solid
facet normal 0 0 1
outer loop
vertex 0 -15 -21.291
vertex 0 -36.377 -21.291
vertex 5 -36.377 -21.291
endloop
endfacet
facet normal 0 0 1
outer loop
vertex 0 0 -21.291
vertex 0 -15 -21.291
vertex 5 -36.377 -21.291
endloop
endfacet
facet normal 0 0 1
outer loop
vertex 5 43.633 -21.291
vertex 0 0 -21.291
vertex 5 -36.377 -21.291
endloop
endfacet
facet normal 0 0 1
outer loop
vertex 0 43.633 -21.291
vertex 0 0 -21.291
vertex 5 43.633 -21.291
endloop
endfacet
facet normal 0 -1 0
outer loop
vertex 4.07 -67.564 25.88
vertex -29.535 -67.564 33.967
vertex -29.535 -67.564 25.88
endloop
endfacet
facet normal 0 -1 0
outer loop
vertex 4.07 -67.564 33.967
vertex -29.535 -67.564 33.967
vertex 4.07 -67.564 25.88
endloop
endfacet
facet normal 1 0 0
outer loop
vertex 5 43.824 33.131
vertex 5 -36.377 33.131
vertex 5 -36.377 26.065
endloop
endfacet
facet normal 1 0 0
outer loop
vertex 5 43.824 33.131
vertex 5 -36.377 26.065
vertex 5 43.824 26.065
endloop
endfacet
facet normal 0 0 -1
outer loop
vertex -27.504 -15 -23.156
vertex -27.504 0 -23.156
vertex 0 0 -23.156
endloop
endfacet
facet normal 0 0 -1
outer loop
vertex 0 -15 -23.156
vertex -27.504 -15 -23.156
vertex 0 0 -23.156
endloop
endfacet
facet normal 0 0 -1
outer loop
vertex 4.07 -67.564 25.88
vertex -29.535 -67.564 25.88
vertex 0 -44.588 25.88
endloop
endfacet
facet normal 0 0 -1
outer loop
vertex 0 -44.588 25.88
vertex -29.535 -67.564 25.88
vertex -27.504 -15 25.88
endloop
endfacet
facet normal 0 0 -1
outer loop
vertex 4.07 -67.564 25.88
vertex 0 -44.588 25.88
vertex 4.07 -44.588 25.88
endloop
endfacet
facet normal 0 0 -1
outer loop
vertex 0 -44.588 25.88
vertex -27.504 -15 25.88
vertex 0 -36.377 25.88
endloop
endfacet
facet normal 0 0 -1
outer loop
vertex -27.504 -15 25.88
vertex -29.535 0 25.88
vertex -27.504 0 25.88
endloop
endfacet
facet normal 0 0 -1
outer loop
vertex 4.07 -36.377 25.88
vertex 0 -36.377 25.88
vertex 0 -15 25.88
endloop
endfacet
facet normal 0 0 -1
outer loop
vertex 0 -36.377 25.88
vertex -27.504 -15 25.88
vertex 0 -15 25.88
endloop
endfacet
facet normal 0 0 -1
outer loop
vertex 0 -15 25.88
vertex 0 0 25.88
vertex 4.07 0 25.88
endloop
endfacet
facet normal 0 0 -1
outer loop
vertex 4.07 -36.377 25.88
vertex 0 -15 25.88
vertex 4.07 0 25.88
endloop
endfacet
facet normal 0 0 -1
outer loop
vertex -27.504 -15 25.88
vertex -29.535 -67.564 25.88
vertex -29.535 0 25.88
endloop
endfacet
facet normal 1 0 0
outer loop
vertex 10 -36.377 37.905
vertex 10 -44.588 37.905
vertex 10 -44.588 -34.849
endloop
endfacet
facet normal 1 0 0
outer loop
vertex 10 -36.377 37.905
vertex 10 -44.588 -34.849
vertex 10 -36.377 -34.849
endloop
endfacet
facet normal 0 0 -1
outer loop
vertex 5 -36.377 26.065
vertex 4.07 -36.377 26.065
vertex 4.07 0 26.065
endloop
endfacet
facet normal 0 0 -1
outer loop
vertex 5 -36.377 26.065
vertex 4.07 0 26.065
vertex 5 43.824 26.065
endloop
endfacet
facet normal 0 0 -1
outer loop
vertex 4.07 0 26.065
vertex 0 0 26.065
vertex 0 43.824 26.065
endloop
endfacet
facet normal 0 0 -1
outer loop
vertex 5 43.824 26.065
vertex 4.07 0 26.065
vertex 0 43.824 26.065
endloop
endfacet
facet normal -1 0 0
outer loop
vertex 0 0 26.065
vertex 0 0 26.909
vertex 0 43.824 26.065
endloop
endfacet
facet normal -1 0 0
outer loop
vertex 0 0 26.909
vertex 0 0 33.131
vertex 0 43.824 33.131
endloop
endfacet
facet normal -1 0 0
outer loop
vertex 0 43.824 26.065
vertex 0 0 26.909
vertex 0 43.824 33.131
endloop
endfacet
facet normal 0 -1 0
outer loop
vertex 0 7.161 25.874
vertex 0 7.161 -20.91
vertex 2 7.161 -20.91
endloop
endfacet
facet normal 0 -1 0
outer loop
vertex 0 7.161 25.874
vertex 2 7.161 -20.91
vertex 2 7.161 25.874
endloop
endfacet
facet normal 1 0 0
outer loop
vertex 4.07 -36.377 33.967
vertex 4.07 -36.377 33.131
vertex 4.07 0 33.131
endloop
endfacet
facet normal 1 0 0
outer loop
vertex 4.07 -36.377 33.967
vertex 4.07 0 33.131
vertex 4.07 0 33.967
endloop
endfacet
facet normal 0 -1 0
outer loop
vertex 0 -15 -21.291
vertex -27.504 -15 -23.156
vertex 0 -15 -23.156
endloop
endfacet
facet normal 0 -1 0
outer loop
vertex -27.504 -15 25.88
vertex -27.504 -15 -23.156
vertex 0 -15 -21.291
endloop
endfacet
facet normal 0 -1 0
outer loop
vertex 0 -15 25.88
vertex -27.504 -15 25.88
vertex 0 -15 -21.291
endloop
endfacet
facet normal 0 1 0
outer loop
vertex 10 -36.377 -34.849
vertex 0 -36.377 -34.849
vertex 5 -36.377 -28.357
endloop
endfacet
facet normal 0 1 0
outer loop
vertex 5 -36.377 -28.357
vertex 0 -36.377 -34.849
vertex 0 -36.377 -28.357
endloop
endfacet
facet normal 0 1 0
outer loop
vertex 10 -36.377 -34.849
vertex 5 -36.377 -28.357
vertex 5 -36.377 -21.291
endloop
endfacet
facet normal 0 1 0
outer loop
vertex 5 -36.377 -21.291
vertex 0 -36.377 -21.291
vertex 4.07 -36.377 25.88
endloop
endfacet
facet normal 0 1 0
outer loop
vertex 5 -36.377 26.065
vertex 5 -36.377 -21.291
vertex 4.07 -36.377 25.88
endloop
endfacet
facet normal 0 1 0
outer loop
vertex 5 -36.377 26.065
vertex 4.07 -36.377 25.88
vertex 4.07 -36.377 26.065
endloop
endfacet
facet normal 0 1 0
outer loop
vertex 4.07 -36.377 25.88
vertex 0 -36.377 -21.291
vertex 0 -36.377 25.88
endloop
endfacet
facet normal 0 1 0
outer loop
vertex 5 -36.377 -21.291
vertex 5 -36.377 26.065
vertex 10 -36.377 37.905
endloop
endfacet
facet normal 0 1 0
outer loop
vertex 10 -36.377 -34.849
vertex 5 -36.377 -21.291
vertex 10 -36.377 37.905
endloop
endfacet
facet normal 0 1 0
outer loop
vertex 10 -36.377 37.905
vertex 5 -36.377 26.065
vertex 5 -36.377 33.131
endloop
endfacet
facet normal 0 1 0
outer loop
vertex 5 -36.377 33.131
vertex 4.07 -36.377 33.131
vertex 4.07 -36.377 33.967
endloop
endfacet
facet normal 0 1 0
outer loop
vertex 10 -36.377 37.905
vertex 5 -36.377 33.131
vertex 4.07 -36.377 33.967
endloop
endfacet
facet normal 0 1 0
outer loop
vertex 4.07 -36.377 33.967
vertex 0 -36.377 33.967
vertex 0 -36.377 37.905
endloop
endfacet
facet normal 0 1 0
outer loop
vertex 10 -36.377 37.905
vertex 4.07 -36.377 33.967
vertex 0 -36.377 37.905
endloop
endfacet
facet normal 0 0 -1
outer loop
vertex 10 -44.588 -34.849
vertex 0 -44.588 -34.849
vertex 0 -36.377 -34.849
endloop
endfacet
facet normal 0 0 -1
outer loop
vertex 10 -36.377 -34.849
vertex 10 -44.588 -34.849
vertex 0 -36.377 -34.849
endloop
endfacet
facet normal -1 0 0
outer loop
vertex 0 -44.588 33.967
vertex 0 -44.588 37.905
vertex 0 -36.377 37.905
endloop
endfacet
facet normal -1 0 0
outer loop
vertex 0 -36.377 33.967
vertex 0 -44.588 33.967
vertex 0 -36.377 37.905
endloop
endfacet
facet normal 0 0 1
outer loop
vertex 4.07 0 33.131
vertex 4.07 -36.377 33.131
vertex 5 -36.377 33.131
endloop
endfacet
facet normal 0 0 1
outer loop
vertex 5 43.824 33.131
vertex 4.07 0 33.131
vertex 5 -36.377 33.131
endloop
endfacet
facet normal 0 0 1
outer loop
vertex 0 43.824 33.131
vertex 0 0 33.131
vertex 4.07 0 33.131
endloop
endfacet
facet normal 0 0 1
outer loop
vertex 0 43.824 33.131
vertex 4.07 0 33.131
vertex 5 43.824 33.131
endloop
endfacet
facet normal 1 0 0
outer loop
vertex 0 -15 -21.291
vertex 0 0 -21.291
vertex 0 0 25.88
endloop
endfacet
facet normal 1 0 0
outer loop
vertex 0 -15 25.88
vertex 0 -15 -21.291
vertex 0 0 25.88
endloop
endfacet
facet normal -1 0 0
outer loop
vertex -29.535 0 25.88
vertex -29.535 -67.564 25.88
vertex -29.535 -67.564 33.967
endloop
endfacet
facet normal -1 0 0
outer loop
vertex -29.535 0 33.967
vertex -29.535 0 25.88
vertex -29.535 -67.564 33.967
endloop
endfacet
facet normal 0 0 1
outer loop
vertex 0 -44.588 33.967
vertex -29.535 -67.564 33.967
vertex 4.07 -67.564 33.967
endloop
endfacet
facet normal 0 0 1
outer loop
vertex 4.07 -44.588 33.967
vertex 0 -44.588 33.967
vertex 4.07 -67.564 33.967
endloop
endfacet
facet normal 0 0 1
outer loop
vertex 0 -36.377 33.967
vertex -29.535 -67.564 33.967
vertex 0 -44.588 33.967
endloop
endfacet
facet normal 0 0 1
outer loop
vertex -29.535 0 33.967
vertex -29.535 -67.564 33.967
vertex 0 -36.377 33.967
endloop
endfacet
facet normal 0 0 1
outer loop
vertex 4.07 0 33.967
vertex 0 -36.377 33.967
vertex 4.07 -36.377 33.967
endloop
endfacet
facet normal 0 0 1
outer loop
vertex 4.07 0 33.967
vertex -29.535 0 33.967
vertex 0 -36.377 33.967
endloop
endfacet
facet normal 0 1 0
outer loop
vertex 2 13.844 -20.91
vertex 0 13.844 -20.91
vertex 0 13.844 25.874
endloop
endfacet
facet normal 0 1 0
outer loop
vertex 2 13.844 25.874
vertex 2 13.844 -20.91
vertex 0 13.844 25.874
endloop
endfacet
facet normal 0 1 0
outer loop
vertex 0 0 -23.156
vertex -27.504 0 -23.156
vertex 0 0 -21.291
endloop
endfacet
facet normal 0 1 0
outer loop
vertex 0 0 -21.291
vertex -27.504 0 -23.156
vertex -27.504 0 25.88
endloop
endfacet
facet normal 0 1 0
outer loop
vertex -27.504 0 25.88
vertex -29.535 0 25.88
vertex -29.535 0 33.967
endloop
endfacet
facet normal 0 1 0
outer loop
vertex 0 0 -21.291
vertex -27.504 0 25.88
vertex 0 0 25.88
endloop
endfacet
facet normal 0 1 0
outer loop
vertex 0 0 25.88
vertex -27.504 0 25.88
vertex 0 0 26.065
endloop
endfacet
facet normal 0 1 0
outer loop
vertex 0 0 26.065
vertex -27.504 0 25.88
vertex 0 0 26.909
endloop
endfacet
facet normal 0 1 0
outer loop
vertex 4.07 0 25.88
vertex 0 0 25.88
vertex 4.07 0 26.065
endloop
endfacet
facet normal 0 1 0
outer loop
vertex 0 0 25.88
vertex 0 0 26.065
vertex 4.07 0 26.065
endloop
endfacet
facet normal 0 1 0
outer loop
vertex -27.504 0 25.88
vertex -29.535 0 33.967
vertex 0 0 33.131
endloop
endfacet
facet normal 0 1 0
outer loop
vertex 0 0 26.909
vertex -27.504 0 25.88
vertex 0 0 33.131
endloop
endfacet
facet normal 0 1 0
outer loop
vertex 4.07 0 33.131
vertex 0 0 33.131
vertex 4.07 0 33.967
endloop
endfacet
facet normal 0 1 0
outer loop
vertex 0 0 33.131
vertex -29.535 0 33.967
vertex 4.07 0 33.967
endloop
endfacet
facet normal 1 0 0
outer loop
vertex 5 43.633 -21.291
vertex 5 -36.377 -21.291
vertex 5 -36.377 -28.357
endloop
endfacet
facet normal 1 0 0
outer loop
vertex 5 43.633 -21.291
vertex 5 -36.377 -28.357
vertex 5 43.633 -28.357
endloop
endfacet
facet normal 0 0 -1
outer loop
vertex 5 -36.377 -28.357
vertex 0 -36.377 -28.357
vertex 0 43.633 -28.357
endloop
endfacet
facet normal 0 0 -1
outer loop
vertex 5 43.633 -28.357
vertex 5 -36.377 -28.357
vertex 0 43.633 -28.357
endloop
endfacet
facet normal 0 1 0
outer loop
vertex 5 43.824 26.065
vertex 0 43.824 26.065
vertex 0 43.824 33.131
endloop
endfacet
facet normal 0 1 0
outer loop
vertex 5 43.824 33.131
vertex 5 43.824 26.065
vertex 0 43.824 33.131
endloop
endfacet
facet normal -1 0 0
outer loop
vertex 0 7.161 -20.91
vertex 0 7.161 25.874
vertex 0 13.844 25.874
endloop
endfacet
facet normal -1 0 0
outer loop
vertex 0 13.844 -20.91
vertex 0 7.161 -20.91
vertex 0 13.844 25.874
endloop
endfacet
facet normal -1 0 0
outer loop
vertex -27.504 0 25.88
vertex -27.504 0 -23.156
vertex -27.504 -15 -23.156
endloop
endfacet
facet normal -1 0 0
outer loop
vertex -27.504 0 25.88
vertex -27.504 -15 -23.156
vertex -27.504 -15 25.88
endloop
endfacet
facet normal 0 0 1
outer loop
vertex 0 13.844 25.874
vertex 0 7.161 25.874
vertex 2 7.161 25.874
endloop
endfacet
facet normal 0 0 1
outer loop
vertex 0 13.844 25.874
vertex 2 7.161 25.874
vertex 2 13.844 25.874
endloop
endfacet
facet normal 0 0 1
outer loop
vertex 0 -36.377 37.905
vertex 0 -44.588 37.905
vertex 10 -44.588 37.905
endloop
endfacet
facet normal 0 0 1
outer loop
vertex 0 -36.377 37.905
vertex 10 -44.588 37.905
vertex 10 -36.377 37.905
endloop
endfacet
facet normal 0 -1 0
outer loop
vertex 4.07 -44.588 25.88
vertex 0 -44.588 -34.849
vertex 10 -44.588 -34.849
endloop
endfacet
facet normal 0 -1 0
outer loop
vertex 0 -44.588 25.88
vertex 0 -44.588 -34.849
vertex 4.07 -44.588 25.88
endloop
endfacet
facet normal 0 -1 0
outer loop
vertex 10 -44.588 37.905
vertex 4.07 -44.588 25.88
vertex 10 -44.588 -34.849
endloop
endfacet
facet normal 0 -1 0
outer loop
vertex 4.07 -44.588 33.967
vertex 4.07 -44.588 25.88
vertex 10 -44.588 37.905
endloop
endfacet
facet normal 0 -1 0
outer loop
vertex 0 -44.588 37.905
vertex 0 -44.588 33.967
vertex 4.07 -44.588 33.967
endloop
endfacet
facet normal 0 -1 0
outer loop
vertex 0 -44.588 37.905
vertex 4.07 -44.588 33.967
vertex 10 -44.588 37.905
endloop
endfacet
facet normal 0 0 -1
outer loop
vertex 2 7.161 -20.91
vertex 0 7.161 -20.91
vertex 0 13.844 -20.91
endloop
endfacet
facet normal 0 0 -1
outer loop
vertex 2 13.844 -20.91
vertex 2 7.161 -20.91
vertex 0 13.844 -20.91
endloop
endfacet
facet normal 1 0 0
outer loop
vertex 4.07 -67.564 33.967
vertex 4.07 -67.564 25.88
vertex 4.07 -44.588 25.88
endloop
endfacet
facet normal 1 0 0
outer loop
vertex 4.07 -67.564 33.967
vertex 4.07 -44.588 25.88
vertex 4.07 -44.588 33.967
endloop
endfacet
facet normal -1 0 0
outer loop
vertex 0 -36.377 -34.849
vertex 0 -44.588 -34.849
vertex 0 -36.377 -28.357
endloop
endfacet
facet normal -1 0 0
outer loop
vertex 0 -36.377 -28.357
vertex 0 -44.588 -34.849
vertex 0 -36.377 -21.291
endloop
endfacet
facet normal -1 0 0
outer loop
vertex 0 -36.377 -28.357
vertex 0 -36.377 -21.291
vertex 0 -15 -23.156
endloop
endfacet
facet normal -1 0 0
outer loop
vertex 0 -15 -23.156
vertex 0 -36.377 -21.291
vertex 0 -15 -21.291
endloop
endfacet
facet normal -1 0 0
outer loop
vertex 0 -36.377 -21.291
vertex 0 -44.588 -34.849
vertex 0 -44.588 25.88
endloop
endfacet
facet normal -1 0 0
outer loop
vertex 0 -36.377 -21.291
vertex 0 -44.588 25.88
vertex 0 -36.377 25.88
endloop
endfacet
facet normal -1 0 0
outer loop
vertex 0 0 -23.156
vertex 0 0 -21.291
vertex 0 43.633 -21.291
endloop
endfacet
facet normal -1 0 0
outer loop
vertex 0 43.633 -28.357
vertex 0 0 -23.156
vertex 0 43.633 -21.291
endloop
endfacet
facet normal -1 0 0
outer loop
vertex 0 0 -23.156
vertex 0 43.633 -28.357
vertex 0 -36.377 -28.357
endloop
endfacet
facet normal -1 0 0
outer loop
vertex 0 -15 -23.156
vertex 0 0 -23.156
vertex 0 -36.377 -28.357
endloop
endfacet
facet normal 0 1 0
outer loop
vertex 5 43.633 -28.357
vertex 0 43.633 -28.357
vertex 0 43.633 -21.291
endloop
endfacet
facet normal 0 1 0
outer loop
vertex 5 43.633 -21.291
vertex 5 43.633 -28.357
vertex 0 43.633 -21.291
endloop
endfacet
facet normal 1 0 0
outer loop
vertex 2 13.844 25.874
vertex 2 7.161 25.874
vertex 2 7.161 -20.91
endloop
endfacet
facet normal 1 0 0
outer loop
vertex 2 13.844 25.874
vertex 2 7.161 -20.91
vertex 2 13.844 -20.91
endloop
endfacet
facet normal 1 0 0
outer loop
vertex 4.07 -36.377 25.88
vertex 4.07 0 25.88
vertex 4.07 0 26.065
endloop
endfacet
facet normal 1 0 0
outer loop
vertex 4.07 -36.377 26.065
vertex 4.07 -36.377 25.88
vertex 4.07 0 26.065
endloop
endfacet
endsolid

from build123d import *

# Parameters (mm, degrees)
F0_W      = 8.211054
F0_H      = 72.753724
F1_DEPTH  = 10
F2_W      = 80.200952
F2_H      = 7.065325
F3_DEPTH  = 5
F4_W      = 80.010001
F4_H      = 7.065322
F5_DEPTH  = 5
F7_W      = 6.683413
F7_H      = 46.783891
F8_DEPTH  = 2
F9_W      = 27.504185
F9_H      = 50.065406
F10_DEPTH = 15
F11_W     = 33.604937
F11_H     = 8.086341
F12_DEPTH = 67.564


with BuildPart() as f1:
    # F0 (on Right) → F1 (new body)
    with BuildSketch(Plane.YZ):
        with Locations((-40.482387, 1.527639)):
            Rectangle(F0_W, F0_H)
    extrude(amount=F1_DEPTH)

    # F2 (on Right) → F3 (join)
    with BuildSketch(Plane.YZ):
        with Locations((3.723616, 29.597972)):
            Rectangle(F2_W, F2_H)
    extrude(amount=F3_DEPTH)

    # F4 (on Right) → F5 (join)
    with BuildSketch(Plane.YZ):
        with Locations((3.62814, -24.824105)):
            Rectangle(F4_W, F4_H)
    extrude(amount=F5_DEPTH)

    # F9 (on Front) → F10 (join)
    with BuildSketch(Plane.XZ):
        with Locations((-13.752092, 1.876714)):
            Rectangle(F9_W, F9_H)
    extrude(amount=F10_DEPTH)

    # F11 (on Front) → F12 (join)
    with BuildSketch(Plane.XZ):
        with Locations((-12.732708, 29.923404)):
            Rectangle(F11_W, F11_H)
    extrude(amount=F12_DEPTH)


with BuildPart() as f8:
    # F7 (on Right) → F8 (new body)
    with BuildSketch(Plane.YZ):
        with Locations((10.502506, 2.482411)):
            Rectangle(F7_W, F7_H)
    extrude(amount=F8_DEPTH)


solid = Compound([f1.part, f8.part])
